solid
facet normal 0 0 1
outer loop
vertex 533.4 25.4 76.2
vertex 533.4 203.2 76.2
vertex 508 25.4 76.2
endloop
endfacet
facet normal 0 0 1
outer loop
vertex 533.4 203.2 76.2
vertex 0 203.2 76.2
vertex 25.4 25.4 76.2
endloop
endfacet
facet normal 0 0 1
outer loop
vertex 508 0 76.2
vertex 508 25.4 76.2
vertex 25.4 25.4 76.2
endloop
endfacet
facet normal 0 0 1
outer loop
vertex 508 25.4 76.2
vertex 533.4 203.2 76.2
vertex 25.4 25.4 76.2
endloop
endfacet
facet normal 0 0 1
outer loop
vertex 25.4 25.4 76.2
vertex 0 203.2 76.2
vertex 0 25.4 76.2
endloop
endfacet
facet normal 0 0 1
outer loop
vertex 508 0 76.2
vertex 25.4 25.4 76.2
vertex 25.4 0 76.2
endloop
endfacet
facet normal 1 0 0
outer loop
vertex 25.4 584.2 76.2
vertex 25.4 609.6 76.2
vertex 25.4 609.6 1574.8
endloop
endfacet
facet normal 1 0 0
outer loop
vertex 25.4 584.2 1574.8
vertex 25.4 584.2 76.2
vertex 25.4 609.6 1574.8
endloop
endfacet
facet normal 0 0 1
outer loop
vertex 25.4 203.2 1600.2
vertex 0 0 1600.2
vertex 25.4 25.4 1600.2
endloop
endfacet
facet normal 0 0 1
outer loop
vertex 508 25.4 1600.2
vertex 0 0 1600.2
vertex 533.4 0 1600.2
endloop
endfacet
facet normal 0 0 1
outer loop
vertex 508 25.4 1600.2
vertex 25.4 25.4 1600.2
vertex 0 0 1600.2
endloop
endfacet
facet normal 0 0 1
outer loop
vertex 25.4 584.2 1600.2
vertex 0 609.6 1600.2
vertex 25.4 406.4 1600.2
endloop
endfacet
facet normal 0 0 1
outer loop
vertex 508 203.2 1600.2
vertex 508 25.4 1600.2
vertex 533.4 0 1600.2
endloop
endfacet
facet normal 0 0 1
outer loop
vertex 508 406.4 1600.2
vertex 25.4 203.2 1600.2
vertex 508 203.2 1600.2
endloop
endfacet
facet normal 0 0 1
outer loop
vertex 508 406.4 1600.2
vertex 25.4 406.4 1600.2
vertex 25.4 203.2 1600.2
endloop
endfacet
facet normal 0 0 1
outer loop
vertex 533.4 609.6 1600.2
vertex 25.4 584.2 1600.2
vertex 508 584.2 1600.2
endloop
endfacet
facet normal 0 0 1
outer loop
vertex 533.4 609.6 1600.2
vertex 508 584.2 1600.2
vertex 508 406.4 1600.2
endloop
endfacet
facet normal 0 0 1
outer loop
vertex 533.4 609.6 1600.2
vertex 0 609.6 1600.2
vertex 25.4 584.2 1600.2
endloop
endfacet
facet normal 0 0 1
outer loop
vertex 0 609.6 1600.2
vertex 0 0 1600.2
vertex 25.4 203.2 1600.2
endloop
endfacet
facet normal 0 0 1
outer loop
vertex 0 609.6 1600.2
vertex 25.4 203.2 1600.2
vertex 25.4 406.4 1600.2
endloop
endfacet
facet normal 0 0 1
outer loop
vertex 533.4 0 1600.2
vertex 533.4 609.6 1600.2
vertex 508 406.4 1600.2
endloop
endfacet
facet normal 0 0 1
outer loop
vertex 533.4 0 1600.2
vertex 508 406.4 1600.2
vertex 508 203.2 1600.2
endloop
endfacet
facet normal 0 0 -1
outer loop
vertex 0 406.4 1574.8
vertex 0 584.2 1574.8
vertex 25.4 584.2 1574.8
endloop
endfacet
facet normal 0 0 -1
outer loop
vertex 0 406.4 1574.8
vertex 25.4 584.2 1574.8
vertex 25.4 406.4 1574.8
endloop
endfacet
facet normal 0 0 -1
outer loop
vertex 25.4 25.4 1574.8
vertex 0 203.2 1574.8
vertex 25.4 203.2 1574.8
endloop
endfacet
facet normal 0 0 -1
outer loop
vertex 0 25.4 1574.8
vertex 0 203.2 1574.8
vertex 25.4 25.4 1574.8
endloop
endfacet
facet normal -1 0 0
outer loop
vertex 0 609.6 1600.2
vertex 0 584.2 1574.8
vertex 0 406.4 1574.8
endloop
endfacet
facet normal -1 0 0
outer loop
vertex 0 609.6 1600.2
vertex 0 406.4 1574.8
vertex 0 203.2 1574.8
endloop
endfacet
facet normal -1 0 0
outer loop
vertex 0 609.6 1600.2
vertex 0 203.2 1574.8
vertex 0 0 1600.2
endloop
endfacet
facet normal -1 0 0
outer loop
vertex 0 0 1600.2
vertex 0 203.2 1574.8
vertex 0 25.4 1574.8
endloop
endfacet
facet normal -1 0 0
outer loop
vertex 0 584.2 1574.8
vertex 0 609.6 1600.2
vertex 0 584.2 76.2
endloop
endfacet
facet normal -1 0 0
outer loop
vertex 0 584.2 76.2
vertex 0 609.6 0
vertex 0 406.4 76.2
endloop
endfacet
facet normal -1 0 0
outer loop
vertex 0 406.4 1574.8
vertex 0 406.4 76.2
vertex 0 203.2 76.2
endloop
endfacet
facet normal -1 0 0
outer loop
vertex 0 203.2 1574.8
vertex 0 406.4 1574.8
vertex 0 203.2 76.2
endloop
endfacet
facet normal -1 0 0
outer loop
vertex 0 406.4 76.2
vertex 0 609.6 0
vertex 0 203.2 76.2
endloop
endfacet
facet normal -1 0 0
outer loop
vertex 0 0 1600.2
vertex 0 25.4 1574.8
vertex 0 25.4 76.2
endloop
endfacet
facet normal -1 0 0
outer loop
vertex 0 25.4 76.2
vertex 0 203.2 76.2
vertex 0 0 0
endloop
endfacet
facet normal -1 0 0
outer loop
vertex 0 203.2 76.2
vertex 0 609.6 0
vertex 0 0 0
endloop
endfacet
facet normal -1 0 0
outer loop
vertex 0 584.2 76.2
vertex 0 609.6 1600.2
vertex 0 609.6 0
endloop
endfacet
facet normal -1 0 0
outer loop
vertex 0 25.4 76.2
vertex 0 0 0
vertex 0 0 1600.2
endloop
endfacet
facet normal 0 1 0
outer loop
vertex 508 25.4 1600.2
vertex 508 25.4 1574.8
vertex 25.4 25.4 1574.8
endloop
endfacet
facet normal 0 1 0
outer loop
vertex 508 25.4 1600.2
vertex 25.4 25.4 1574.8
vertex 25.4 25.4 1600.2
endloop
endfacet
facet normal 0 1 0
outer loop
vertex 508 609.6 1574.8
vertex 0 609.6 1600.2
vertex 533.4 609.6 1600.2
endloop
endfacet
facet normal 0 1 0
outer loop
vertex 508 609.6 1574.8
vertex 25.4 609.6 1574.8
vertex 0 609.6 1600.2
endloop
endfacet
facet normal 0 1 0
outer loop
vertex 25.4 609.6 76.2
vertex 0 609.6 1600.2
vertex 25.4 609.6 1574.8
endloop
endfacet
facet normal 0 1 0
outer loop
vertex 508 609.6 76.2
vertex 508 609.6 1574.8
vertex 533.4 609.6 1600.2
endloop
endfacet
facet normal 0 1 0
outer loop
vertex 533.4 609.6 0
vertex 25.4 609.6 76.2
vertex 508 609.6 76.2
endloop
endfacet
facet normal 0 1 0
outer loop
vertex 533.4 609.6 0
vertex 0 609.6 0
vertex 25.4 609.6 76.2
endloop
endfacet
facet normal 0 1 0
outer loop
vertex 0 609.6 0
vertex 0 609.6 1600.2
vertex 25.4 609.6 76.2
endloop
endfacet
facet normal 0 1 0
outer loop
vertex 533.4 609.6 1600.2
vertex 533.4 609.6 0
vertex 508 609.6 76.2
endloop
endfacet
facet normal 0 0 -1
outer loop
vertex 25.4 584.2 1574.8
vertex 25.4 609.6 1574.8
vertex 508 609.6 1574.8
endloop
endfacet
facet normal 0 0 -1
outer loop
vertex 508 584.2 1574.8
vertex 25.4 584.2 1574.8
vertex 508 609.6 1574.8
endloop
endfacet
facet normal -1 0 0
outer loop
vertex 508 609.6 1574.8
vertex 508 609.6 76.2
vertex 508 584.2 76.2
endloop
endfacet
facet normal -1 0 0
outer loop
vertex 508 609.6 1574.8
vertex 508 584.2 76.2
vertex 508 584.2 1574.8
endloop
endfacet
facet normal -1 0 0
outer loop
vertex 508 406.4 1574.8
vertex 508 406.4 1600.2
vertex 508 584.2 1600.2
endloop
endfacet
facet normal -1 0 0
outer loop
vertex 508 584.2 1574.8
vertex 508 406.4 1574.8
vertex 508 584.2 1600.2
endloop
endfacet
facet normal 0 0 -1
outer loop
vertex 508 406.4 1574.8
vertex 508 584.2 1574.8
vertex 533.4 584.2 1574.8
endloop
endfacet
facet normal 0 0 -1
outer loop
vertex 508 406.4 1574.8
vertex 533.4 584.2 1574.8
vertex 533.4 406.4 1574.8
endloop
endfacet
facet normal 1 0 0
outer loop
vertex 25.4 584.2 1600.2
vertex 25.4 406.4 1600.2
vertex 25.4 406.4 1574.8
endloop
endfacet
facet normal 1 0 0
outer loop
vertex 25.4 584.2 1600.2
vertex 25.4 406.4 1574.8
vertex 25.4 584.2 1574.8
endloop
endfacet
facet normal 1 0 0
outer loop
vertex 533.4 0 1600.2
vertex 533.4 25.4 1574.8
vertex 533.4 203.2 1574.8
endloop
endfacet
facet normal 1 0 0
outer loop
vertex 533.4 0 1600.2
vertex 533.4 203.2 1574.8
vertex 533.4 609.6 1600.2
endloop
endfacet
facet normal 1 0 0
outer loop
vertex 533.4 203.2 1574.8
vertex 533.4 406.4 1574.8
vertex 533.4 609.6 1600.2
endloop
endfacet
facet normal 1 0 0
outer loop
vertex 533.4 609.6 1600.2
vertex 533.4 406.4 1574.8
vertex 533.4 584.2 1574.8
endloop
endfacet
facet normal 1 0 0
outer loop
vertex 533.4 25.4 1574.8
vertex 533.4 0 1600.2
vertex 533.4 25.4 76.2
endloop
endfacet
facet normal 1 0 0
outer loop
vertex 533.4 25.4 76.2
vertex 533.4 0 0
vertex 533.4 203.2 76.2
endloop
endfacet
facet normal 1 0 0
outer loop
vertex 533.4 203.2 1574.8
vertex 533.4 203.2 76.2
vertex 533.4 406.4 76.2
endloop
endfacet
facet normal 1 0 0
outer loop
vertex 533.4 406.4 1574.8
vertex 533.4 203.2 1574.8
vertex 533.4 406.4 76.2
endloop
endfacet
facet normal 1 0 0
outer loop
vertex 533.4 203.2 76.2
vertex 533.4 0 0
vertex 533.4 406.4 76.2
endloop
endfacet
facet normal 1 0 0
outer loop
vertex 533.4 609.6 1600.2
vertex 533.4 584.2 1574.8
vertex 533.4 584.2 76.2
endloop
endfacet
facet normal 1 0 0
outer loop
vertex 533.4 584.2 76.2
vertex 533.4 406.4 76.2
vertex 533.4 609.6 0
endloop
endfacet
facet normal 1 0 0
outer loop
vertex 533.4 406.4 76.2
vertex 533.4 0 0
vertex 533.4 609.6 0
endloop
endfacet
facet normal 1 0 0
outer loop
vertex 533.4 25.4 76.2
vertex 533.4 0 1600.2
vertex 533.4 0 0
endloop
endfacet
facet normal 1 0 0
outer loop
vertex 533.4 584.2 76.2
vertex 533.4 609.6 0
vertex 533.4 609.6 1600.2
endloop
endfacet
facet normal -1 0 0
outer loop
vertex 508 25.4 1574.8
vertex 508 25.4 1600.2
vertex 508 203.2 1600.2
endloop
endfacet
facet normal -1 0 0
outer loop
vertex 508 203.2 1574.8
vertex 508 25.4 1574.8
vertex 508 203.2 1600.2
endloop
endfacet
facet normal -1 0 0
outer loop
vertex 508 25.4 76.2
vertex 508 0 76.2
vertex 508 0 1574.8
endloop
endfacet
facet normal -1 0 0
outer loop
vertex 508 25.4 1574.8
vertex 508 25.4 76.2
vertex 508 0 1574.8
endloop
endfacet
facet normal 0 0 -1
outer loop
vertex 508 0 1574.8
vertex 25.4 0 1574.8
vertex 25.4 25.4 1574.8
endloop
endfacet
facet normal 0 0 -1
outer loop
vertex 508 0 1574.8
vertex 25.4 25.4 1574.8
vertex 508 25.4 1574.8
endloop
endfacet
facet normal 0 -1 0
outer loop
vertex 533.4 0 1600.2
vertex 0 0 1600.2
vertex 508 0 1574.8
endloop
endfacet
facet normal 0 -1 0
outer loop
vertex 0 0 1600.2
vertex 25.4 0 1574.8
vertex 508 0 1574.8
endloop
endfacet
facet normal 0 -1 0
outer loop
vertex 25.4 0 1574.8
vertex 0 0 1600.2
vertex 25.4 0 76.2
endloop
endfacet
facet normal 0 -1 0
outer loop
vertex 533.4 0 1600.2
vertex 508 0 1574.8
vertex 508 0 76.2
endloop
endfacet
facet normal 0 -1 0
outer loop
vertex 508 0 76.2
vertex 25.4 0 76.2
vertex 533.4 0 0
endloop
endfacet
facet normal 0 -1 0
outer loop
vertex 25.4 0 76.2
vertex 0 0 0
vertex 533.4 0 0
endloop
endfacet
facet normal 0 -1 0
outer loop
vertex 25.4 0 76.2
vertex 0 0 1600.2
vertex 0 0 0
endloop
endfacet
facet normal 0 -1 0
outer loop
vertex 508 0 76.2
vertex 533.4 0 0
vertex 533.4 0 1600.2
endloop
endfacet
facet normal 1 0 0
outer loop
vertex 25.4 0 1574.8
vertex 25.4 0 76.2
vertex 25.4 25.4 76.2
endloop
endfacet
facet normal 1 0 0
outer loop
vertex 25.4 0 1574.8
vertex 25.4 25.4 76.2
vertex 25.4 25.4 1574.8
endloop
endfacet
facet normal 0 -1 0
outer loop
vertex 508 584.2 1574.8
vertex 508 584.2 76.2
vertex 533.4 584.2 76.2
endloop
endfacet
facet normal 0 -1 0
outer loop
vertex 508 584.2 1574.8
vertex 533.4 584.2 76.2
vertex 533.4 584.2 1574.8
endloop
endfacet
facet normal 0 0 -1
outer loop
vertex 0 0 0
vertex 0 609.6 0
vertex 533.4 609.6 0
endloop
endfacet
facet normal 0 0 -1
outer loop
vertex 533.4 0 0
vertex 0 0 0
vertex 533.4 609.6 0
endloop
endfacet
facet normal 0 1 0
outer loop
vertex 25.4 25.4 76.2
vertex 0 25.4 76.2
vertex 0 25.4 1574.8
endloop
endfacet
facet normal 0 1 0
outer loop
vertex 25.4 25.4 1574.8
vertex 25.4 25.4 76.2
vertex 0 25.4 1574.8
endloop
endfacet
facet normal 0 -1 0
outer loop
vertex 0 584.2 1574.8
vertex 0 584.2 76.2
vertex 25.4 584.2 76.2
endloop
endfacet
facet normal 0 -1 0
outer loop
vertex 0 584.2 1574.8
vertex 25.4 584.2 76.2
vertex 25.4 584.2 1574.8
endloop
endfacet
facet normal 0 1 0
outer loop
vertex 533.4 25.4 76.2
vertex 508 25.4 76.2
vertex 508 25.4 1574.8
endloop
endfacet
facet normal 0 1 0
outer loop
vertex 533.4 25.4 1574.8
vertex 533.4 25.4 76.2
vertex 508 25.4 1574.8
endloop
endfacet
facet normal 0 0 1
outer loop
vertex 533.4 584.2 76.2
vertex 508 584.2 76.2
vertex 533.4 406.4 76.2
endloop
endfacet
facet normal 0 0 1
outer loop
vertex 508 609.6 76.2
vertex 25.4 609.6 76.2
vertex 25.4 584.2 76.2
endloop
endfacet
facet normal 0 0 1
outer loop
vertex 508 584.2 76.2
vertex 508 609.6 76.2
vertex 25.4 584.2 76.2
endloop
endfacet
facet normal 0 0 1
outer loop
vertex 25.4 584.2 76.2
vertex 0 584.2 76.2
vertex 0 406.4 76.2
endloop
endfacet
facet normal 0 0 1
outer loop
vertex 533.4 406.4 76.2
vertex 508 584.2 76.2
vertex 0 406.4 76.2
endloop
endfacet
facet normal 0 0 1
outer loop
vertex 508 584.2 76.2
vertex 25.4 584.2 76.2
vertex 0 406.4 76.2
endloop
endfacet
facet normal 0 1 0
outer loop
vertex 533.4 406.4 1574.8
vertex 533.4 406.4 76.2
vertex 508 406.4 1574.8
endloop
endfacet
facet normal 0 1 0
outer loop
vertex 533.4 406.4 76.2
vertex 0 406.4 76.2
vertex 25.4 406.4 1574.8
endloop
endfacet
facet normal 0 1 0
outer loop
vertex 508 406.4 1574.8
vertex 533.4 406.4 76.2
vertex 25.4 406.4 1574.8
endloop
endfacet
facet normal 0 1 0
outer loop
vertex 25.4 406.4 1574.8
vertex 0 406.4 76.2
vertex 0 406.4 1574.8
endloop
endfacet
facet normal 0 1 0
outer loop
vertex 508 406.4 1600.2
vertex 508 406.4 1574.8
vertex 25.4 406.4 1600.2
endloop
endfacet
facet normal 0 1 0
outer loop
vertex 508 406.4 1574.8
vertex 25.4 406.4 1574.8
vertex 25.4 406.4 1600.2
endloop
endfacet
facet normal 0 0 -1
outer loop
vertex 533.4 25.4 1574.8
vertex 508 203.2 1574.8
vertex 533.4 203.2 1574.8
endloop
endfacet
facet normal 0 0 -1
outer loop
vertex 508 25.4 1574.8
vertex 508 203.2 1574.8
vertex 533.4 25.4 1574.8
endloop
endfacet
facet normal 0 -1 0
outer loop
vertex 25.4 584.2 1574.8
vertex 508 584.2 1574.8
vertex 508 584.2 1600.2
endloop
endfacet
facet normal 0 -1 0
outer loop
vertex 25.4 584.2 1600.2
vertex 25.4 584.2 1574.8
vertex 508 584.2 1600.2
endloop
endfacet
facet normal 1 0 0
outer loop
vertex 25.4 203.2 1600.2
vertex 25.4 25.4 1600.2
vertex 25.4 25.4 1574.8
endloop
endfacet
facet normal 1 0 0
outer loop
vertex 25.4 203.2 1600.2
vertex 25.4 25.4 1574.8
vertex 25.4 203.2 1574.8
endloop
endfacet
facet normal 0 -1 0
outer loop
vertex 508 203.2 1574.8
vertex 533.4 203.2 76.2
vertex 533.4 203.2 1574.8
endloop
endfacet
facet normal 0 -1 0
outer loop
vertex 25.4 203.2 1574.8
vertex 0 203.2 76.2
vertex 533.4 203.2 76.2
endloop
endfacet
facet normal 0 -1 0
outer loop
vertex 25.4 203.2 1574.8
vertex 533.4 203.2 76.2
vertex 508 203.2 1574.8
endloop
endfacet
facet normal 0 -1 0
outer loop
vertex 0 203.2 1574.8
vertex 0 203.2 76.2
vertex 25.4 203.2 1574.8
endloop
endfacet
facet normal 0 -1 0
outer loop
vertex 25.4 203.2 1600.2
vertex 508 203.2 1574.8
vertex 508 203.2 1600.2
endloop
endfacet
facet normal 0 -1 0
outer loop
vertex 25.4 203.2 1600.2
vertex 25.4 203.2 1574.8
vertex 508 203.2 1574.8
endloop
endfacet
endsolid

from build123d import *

# Parameters (mm, degrees)
F0_W     = 533.4
F0_H     = 203.2
F1_DEPTH = 1600.2
F2_W     = 177.8
F2_H     = 1498.6
F3_DEPTH = 533.401
F4_W     = 482.6
F4_H     = 177.8
F5_DEPTH = 76.2
F6_W     = 482.6
F6_H     = 1498.6
F7_DEPTH = 50.8


# Not quite as in the source:
# - a pattern or mirror of a feature is missing from the dataset's text; its kind, count and spacing are read off the source's solid


with BuildPart() as f1:
    # F0 (on Top) → F1 (new body)
    with BuildSketch(Plane.XY):
        with Locations((266.7, 508)):
            Rectangle(F0_W, F0_H)
        with Locations((266.7, 101.6)):
            Rectangle(F0_W, F0_H)
        with Locations((266.7, 304.8)):
            Rectangle(F0_W, F0_H)
    extrude(amount=F1_DEPTH)

    # F2 (on face) → F3 (cut, through all)
    with BuildSketch(Plane(origin=(0, 0, 0), x_dir=(0, -1, 0), z_dir=(-1, 0, 0))):
        with Locations((-495.3, 825.5)):
            Rectangle(F2_W, F2_H)
        with Locations((-114.3, 825.5)):
            Rectangle(F2_W, F2_H)
    extrude(amount=-F3_DEPTH, mode=Mode.SUBTRACT)

    # F4 (on face) → F5 (cut)
    with BuildSketch(Plane.XY.offset(1600.2)):
        with Locations((266.7, 495.3)):
            Rectangle(F4_W, F4_H)
        with Locations((266.7, 114.3)):
            Rectangle(F4_W, F4_H)
    extrude(amount=-F5_DEPTH, mode=Mode.SUBTRACT)

    # F6 (on face) → F7 (cut)
    with BuildSketch(Plane.XZ):
        with Locations((266.7, 825.5)):
            Rectangle(F6_W, F6_H)
    f7 = extrude(amount=-F7_DEPTH, mode=Mode.SUBTRACT)

    # F7_copies: F7 across plane
    add(f7.mirror(Plane.ZX.offset(304.8)), mode=Mode.SUBTRACT)


solid = f1.part
